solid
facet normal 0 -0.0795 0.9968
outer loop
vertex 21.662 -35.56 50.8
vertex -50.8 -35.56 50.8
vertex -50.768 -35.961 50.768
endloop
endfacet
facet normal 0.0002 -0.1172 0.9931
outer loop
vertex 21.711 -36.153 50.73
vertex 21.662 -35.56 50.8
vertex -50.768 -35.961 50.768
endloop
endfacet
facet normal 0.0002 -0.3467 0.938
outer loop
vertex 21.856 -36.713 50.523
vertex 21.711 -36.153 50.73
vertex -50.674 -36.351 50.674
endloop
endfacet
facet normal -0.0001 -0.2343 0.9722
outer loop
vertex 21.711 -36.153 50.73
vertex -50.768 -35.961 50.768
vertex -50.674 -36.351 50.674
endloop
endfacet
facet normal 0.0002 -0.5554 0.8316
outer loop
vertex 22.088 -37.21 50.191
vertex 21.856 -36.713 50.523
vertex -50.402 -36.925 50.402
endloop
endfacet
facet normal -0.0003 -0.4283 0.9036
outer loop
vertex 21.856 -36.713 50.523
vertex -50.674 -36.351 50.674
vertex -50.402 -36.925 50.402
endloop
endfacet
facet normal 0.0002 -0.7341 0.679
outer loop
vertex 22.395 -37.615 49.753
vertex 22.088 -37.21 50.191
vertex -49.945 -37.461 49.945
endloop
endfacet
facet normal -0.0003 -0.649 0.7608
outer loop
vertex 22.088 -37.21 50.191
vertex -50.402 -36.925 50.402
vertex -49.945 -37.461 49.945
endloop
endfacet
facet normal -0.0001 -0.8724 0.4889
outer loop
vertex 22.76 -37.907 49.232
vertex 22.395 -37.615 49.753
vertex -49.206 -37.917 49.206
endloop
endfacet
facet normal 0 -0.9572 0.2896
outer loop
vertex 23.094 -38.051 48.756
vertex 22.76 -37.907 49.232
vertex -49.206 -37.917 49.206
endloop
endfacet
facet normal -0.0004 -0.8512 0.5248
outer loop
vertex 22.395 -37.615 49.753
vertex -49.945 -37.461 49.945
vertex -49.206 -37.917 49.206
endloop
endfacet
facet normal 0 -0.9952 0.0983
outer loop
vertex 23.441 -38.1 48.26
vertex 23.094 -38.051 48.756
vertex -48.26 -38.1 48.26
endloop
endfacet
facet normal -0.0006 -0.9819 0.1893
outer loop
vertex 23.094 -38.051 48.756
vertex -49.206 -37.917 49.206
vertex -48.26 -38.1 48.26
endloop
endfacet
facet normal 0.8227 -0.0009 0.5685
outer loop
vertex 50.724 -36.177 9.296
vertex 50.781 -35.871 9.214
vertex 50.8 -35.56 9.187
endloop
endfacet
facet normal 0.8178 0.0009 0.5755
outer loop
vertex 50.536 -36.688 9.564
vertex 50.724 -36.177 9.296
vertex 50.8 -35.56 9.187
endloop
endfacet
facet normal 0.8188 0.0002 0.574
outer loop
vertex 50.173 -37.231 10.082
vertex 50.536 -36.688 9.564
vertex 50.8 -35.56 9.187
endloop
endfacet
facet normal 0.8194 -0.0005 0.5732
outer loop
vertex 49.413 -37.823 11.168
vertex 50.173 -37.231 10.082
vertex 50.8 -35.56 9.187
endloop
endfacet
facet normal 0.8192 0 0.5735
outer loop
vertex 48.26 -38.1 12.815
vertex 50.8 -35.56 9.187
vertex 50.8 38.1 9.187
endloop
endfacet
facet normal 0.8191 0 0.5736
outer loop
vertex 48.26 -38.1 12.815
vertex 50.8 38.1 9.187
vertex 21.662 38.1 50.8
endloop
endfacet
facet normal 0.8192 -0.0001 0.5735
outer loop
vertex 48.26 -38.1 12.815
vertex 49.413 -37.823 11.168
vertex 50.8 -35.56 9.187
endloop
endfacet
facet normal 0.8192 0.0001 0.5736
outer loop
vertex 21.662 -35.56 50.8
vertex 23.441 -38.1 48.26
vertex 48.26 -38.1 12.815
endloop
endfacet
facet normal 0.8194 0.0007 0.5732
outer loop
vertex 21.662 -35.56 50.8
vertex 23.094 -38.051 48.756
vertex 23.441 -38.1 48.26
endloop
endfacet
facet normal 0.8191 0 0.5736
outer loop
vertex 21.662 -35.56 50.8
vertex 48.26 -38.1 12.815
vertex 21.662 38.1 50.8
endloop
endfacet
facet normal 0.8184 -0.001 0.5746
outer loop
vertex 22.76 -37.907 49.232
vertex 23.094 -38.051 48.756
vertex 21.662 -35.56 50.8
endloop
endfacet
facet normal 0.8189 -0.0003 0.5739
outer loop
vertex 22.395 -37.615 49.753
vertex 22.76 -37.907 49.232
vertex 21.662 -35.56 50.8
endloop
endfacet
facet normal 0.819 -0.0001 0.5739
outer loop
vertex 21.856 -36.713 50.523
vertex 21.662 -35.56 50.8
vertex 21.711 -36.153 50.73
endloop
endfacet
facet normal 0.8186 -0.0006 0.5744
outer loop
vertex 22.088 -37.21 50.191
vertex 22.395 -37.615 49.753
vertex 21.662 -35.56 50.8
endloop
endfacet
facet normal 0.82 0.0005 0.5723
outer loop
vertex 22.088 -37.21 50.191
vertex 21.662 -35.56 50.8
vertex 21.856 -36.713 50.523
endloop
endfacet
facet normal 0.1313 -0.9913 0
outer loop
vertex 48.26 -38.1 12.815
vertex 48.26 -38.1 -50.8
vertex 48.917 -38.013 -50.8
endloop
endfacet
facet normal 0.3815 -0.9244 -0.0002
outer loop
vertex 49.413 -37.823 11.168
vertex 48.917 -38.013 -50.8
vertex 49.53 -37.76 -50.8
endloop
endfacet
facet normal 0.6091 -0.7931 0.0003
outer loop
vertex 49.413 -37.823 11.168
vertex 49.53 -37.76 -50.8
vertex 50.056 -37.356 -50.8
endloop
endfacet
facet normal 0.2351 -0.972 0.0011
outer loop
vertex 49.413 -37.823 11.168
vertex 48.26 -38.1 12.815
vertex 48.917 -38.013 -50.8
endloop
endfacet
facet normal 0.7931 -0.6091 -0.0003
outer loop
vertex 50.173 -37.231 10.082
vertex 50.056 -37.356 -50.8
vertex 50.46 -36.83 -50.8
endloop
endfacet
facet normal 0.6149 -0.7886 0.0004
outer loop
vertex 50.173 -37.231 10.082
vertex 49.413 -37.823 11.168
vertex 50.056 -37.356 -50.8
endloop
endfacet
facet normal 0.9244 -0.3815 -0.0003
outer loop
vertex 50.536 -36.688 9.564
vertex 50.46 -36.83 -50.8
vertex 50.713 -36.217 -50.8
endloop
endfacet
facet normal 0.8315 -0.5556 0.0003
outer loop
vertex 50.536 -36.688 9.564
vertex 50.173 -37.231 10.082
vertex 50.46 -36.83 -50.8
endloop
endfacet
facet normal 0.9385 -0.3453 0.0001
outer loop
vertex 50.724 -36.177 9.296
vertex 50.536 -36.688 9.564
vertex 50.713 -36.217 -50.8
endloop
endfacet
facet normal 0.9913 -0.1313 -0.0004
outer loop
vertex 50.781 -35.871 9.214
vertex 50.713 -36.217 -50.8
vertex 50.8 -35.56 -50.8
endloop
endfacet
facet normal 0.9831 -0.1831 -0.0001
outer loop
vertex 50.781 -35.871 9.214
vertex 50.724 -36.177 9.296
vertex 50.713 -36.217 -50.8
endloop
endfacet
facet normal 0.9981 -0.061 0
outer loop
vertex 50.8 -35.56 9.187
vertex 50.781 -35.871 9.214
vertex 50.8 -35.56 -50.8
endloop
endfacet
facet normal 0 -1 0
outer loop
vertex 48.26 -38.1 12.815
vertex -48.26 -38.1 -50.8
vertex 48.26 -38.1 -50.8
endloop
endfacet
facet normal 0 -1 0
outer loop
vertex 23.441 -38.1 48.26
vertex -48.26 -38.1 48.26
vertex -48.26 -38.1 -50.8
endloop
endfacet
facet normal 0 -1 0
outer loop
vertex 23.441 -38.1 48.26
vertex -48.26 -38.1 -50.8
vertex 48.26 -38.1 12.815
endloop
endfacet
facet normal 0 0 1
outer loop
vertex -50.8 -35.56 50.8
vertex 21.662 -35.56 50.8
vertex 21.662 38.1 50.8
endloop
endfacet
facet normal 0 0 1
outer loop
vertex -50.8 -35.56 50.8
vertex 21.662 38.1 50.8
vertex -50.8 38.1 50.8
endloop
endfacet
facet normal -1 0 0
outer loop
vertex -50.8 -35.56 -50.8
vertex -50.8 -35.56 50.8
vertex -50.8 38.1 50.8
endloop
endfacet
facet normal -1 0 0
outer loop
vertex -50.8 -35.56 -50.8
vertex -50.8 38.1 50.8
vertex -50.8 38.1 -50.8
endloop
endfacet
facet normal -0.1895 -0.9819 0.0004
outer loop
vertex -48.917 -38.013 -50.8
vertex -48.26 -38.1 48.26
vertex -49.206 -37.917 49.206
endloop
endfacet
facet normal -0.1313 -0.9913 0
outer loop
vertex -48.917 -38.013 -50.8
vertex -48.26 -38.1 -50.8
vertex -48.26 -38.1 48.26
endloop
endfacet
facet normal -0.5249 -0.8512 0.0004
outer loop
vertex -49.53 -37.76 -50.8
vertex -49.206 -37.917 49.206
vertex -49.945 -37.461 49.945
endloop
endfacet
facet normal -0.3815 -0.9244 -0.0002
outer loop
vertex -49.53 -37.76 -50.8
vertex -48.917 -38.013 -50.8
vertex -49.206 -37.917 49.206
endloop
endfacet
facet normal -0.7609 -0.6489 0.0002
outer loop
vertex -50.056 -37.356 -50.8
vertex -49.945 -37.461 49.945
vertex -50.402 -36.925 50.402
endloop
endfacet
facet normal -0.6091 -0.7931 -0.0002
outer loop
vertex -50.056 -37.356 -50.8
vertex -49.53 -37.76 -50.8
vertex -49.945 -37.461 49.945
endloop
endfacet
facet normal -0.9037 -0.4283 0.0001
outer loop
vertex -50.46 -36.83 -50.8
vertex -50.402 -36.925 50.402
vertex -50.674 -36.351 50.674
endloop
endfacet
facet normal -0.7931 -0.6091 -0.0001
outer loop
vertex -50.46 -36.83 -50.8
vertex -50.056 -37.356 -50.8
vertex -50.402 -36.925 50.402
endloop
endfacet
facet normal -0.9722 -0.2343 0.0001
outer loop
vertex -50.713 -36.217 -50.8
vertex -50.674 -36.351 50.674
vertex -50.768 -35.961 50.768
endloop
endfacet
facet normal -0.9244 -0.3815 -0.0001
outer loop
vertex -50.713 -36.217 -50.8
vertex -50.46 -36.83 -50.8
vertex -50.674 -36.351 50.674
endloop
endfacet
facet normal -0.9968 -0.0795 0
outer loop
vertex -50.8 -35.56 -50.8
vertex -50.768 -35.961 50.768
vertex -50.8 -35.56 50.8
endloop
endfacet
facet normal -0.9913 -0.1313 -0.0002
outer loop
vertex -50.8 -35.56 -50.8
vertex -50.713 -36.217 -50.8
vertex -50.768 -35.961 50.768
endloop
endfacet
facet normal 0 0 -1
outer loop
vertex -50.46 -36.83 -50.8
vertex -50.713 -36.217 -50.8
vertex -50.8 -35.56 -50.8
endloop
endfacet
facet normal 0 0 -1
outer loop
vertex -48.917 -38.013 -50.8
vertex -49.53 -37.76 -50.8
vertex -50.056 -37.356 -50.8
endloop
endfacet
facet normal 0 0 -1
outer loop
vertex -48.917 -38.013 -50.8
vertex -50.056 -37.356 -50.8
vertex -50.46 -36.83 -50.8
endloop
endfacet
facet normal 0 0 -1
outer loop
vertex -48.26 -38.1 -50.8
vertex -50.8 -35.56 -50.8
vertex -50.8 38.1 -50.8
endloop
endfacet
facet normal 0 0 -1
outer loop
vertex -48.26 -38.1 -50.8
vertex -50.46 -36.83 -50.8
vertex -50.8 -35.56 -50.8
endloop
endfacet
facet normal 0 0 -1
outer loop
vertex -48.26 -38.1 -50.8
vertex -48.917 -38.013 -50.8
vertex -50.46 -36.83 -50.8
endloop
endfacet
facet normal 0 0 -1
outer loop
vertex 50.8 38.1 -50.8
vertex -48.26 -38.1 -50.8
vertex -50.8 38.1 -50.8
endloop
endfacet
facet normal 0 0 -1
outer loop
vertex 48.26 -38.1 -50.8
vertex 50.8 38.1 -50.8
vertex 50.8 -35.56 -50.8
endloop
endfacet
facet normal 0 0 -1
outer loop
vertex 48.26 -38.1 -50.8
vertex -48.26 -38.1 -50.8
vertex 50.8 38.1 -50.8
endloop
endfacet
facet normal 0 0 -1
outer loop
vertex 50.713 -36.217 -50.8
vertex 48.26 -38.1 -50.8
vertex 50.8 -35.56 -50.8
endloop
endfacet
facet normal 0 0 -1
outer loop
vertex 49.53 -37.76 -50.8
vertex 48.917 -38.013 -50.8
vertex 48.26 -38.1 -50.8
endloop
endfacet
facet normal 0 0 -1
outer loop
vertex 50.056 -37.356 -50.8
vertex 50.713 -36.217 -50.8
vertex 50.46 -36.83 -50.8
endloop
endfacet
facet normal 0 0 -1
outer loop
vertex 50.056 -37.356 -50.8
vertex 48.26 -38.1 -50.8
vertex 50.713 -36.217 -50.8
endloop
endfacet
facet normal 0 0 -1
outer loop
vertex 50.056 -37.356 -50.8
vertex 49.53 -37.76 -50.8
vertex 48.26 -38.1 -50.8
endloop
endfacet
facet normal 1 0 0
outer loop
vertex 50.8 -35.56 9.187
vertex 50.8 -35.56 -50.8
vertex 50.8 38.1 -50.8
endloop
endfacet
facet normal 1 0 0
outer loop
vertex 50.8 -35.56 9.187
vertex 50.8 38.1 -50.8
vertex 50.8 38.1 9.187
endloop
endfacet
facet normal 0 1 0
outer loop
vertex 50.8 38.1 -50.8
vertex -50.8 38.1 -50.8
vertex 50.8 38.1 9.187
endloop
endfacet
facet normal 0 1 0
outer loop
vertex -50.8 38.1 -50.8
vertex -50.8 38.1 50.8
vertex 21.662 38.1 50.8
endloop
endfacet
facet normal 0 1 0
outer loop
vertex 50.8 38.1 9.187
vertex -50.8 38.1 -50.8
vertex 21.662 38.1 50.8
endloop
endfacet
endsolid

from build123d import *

# Parameters (mm, degrees)
F1_DEPTH = 38.1
F2_R     = 2.54
F3_R     = 2.54


with BuildPart() as f1:
    # F0 (on Front) → F1 (new body, symmetric)
    with BuildSketch(Plane.XZ):
        Polygon((21.662317, 50.8), (-50.8, 50.8), (-50.8, -50.8), (50.8, -50.8), (50.8, 9.187076), align=None)
    extrude(amount=F1_DEPTH, both=True)

    # F2
    f2_edges = [f1.edges().sort_by_distance(p)[0] for p in [
        (-50.8, -38.1, 0),
        (-14.568841, -38.1, 50.8),
    ]]
    fillet(f2_edges, radius=F2_R)

    # F3
    f3_edges = [f1.edges().sort_by_distance(p)[0] for p in [
        (50.8, -38.1, -20.806462),
    ]]
    fillet(f3_edges, radius=F3_R)


solid = f1.part
